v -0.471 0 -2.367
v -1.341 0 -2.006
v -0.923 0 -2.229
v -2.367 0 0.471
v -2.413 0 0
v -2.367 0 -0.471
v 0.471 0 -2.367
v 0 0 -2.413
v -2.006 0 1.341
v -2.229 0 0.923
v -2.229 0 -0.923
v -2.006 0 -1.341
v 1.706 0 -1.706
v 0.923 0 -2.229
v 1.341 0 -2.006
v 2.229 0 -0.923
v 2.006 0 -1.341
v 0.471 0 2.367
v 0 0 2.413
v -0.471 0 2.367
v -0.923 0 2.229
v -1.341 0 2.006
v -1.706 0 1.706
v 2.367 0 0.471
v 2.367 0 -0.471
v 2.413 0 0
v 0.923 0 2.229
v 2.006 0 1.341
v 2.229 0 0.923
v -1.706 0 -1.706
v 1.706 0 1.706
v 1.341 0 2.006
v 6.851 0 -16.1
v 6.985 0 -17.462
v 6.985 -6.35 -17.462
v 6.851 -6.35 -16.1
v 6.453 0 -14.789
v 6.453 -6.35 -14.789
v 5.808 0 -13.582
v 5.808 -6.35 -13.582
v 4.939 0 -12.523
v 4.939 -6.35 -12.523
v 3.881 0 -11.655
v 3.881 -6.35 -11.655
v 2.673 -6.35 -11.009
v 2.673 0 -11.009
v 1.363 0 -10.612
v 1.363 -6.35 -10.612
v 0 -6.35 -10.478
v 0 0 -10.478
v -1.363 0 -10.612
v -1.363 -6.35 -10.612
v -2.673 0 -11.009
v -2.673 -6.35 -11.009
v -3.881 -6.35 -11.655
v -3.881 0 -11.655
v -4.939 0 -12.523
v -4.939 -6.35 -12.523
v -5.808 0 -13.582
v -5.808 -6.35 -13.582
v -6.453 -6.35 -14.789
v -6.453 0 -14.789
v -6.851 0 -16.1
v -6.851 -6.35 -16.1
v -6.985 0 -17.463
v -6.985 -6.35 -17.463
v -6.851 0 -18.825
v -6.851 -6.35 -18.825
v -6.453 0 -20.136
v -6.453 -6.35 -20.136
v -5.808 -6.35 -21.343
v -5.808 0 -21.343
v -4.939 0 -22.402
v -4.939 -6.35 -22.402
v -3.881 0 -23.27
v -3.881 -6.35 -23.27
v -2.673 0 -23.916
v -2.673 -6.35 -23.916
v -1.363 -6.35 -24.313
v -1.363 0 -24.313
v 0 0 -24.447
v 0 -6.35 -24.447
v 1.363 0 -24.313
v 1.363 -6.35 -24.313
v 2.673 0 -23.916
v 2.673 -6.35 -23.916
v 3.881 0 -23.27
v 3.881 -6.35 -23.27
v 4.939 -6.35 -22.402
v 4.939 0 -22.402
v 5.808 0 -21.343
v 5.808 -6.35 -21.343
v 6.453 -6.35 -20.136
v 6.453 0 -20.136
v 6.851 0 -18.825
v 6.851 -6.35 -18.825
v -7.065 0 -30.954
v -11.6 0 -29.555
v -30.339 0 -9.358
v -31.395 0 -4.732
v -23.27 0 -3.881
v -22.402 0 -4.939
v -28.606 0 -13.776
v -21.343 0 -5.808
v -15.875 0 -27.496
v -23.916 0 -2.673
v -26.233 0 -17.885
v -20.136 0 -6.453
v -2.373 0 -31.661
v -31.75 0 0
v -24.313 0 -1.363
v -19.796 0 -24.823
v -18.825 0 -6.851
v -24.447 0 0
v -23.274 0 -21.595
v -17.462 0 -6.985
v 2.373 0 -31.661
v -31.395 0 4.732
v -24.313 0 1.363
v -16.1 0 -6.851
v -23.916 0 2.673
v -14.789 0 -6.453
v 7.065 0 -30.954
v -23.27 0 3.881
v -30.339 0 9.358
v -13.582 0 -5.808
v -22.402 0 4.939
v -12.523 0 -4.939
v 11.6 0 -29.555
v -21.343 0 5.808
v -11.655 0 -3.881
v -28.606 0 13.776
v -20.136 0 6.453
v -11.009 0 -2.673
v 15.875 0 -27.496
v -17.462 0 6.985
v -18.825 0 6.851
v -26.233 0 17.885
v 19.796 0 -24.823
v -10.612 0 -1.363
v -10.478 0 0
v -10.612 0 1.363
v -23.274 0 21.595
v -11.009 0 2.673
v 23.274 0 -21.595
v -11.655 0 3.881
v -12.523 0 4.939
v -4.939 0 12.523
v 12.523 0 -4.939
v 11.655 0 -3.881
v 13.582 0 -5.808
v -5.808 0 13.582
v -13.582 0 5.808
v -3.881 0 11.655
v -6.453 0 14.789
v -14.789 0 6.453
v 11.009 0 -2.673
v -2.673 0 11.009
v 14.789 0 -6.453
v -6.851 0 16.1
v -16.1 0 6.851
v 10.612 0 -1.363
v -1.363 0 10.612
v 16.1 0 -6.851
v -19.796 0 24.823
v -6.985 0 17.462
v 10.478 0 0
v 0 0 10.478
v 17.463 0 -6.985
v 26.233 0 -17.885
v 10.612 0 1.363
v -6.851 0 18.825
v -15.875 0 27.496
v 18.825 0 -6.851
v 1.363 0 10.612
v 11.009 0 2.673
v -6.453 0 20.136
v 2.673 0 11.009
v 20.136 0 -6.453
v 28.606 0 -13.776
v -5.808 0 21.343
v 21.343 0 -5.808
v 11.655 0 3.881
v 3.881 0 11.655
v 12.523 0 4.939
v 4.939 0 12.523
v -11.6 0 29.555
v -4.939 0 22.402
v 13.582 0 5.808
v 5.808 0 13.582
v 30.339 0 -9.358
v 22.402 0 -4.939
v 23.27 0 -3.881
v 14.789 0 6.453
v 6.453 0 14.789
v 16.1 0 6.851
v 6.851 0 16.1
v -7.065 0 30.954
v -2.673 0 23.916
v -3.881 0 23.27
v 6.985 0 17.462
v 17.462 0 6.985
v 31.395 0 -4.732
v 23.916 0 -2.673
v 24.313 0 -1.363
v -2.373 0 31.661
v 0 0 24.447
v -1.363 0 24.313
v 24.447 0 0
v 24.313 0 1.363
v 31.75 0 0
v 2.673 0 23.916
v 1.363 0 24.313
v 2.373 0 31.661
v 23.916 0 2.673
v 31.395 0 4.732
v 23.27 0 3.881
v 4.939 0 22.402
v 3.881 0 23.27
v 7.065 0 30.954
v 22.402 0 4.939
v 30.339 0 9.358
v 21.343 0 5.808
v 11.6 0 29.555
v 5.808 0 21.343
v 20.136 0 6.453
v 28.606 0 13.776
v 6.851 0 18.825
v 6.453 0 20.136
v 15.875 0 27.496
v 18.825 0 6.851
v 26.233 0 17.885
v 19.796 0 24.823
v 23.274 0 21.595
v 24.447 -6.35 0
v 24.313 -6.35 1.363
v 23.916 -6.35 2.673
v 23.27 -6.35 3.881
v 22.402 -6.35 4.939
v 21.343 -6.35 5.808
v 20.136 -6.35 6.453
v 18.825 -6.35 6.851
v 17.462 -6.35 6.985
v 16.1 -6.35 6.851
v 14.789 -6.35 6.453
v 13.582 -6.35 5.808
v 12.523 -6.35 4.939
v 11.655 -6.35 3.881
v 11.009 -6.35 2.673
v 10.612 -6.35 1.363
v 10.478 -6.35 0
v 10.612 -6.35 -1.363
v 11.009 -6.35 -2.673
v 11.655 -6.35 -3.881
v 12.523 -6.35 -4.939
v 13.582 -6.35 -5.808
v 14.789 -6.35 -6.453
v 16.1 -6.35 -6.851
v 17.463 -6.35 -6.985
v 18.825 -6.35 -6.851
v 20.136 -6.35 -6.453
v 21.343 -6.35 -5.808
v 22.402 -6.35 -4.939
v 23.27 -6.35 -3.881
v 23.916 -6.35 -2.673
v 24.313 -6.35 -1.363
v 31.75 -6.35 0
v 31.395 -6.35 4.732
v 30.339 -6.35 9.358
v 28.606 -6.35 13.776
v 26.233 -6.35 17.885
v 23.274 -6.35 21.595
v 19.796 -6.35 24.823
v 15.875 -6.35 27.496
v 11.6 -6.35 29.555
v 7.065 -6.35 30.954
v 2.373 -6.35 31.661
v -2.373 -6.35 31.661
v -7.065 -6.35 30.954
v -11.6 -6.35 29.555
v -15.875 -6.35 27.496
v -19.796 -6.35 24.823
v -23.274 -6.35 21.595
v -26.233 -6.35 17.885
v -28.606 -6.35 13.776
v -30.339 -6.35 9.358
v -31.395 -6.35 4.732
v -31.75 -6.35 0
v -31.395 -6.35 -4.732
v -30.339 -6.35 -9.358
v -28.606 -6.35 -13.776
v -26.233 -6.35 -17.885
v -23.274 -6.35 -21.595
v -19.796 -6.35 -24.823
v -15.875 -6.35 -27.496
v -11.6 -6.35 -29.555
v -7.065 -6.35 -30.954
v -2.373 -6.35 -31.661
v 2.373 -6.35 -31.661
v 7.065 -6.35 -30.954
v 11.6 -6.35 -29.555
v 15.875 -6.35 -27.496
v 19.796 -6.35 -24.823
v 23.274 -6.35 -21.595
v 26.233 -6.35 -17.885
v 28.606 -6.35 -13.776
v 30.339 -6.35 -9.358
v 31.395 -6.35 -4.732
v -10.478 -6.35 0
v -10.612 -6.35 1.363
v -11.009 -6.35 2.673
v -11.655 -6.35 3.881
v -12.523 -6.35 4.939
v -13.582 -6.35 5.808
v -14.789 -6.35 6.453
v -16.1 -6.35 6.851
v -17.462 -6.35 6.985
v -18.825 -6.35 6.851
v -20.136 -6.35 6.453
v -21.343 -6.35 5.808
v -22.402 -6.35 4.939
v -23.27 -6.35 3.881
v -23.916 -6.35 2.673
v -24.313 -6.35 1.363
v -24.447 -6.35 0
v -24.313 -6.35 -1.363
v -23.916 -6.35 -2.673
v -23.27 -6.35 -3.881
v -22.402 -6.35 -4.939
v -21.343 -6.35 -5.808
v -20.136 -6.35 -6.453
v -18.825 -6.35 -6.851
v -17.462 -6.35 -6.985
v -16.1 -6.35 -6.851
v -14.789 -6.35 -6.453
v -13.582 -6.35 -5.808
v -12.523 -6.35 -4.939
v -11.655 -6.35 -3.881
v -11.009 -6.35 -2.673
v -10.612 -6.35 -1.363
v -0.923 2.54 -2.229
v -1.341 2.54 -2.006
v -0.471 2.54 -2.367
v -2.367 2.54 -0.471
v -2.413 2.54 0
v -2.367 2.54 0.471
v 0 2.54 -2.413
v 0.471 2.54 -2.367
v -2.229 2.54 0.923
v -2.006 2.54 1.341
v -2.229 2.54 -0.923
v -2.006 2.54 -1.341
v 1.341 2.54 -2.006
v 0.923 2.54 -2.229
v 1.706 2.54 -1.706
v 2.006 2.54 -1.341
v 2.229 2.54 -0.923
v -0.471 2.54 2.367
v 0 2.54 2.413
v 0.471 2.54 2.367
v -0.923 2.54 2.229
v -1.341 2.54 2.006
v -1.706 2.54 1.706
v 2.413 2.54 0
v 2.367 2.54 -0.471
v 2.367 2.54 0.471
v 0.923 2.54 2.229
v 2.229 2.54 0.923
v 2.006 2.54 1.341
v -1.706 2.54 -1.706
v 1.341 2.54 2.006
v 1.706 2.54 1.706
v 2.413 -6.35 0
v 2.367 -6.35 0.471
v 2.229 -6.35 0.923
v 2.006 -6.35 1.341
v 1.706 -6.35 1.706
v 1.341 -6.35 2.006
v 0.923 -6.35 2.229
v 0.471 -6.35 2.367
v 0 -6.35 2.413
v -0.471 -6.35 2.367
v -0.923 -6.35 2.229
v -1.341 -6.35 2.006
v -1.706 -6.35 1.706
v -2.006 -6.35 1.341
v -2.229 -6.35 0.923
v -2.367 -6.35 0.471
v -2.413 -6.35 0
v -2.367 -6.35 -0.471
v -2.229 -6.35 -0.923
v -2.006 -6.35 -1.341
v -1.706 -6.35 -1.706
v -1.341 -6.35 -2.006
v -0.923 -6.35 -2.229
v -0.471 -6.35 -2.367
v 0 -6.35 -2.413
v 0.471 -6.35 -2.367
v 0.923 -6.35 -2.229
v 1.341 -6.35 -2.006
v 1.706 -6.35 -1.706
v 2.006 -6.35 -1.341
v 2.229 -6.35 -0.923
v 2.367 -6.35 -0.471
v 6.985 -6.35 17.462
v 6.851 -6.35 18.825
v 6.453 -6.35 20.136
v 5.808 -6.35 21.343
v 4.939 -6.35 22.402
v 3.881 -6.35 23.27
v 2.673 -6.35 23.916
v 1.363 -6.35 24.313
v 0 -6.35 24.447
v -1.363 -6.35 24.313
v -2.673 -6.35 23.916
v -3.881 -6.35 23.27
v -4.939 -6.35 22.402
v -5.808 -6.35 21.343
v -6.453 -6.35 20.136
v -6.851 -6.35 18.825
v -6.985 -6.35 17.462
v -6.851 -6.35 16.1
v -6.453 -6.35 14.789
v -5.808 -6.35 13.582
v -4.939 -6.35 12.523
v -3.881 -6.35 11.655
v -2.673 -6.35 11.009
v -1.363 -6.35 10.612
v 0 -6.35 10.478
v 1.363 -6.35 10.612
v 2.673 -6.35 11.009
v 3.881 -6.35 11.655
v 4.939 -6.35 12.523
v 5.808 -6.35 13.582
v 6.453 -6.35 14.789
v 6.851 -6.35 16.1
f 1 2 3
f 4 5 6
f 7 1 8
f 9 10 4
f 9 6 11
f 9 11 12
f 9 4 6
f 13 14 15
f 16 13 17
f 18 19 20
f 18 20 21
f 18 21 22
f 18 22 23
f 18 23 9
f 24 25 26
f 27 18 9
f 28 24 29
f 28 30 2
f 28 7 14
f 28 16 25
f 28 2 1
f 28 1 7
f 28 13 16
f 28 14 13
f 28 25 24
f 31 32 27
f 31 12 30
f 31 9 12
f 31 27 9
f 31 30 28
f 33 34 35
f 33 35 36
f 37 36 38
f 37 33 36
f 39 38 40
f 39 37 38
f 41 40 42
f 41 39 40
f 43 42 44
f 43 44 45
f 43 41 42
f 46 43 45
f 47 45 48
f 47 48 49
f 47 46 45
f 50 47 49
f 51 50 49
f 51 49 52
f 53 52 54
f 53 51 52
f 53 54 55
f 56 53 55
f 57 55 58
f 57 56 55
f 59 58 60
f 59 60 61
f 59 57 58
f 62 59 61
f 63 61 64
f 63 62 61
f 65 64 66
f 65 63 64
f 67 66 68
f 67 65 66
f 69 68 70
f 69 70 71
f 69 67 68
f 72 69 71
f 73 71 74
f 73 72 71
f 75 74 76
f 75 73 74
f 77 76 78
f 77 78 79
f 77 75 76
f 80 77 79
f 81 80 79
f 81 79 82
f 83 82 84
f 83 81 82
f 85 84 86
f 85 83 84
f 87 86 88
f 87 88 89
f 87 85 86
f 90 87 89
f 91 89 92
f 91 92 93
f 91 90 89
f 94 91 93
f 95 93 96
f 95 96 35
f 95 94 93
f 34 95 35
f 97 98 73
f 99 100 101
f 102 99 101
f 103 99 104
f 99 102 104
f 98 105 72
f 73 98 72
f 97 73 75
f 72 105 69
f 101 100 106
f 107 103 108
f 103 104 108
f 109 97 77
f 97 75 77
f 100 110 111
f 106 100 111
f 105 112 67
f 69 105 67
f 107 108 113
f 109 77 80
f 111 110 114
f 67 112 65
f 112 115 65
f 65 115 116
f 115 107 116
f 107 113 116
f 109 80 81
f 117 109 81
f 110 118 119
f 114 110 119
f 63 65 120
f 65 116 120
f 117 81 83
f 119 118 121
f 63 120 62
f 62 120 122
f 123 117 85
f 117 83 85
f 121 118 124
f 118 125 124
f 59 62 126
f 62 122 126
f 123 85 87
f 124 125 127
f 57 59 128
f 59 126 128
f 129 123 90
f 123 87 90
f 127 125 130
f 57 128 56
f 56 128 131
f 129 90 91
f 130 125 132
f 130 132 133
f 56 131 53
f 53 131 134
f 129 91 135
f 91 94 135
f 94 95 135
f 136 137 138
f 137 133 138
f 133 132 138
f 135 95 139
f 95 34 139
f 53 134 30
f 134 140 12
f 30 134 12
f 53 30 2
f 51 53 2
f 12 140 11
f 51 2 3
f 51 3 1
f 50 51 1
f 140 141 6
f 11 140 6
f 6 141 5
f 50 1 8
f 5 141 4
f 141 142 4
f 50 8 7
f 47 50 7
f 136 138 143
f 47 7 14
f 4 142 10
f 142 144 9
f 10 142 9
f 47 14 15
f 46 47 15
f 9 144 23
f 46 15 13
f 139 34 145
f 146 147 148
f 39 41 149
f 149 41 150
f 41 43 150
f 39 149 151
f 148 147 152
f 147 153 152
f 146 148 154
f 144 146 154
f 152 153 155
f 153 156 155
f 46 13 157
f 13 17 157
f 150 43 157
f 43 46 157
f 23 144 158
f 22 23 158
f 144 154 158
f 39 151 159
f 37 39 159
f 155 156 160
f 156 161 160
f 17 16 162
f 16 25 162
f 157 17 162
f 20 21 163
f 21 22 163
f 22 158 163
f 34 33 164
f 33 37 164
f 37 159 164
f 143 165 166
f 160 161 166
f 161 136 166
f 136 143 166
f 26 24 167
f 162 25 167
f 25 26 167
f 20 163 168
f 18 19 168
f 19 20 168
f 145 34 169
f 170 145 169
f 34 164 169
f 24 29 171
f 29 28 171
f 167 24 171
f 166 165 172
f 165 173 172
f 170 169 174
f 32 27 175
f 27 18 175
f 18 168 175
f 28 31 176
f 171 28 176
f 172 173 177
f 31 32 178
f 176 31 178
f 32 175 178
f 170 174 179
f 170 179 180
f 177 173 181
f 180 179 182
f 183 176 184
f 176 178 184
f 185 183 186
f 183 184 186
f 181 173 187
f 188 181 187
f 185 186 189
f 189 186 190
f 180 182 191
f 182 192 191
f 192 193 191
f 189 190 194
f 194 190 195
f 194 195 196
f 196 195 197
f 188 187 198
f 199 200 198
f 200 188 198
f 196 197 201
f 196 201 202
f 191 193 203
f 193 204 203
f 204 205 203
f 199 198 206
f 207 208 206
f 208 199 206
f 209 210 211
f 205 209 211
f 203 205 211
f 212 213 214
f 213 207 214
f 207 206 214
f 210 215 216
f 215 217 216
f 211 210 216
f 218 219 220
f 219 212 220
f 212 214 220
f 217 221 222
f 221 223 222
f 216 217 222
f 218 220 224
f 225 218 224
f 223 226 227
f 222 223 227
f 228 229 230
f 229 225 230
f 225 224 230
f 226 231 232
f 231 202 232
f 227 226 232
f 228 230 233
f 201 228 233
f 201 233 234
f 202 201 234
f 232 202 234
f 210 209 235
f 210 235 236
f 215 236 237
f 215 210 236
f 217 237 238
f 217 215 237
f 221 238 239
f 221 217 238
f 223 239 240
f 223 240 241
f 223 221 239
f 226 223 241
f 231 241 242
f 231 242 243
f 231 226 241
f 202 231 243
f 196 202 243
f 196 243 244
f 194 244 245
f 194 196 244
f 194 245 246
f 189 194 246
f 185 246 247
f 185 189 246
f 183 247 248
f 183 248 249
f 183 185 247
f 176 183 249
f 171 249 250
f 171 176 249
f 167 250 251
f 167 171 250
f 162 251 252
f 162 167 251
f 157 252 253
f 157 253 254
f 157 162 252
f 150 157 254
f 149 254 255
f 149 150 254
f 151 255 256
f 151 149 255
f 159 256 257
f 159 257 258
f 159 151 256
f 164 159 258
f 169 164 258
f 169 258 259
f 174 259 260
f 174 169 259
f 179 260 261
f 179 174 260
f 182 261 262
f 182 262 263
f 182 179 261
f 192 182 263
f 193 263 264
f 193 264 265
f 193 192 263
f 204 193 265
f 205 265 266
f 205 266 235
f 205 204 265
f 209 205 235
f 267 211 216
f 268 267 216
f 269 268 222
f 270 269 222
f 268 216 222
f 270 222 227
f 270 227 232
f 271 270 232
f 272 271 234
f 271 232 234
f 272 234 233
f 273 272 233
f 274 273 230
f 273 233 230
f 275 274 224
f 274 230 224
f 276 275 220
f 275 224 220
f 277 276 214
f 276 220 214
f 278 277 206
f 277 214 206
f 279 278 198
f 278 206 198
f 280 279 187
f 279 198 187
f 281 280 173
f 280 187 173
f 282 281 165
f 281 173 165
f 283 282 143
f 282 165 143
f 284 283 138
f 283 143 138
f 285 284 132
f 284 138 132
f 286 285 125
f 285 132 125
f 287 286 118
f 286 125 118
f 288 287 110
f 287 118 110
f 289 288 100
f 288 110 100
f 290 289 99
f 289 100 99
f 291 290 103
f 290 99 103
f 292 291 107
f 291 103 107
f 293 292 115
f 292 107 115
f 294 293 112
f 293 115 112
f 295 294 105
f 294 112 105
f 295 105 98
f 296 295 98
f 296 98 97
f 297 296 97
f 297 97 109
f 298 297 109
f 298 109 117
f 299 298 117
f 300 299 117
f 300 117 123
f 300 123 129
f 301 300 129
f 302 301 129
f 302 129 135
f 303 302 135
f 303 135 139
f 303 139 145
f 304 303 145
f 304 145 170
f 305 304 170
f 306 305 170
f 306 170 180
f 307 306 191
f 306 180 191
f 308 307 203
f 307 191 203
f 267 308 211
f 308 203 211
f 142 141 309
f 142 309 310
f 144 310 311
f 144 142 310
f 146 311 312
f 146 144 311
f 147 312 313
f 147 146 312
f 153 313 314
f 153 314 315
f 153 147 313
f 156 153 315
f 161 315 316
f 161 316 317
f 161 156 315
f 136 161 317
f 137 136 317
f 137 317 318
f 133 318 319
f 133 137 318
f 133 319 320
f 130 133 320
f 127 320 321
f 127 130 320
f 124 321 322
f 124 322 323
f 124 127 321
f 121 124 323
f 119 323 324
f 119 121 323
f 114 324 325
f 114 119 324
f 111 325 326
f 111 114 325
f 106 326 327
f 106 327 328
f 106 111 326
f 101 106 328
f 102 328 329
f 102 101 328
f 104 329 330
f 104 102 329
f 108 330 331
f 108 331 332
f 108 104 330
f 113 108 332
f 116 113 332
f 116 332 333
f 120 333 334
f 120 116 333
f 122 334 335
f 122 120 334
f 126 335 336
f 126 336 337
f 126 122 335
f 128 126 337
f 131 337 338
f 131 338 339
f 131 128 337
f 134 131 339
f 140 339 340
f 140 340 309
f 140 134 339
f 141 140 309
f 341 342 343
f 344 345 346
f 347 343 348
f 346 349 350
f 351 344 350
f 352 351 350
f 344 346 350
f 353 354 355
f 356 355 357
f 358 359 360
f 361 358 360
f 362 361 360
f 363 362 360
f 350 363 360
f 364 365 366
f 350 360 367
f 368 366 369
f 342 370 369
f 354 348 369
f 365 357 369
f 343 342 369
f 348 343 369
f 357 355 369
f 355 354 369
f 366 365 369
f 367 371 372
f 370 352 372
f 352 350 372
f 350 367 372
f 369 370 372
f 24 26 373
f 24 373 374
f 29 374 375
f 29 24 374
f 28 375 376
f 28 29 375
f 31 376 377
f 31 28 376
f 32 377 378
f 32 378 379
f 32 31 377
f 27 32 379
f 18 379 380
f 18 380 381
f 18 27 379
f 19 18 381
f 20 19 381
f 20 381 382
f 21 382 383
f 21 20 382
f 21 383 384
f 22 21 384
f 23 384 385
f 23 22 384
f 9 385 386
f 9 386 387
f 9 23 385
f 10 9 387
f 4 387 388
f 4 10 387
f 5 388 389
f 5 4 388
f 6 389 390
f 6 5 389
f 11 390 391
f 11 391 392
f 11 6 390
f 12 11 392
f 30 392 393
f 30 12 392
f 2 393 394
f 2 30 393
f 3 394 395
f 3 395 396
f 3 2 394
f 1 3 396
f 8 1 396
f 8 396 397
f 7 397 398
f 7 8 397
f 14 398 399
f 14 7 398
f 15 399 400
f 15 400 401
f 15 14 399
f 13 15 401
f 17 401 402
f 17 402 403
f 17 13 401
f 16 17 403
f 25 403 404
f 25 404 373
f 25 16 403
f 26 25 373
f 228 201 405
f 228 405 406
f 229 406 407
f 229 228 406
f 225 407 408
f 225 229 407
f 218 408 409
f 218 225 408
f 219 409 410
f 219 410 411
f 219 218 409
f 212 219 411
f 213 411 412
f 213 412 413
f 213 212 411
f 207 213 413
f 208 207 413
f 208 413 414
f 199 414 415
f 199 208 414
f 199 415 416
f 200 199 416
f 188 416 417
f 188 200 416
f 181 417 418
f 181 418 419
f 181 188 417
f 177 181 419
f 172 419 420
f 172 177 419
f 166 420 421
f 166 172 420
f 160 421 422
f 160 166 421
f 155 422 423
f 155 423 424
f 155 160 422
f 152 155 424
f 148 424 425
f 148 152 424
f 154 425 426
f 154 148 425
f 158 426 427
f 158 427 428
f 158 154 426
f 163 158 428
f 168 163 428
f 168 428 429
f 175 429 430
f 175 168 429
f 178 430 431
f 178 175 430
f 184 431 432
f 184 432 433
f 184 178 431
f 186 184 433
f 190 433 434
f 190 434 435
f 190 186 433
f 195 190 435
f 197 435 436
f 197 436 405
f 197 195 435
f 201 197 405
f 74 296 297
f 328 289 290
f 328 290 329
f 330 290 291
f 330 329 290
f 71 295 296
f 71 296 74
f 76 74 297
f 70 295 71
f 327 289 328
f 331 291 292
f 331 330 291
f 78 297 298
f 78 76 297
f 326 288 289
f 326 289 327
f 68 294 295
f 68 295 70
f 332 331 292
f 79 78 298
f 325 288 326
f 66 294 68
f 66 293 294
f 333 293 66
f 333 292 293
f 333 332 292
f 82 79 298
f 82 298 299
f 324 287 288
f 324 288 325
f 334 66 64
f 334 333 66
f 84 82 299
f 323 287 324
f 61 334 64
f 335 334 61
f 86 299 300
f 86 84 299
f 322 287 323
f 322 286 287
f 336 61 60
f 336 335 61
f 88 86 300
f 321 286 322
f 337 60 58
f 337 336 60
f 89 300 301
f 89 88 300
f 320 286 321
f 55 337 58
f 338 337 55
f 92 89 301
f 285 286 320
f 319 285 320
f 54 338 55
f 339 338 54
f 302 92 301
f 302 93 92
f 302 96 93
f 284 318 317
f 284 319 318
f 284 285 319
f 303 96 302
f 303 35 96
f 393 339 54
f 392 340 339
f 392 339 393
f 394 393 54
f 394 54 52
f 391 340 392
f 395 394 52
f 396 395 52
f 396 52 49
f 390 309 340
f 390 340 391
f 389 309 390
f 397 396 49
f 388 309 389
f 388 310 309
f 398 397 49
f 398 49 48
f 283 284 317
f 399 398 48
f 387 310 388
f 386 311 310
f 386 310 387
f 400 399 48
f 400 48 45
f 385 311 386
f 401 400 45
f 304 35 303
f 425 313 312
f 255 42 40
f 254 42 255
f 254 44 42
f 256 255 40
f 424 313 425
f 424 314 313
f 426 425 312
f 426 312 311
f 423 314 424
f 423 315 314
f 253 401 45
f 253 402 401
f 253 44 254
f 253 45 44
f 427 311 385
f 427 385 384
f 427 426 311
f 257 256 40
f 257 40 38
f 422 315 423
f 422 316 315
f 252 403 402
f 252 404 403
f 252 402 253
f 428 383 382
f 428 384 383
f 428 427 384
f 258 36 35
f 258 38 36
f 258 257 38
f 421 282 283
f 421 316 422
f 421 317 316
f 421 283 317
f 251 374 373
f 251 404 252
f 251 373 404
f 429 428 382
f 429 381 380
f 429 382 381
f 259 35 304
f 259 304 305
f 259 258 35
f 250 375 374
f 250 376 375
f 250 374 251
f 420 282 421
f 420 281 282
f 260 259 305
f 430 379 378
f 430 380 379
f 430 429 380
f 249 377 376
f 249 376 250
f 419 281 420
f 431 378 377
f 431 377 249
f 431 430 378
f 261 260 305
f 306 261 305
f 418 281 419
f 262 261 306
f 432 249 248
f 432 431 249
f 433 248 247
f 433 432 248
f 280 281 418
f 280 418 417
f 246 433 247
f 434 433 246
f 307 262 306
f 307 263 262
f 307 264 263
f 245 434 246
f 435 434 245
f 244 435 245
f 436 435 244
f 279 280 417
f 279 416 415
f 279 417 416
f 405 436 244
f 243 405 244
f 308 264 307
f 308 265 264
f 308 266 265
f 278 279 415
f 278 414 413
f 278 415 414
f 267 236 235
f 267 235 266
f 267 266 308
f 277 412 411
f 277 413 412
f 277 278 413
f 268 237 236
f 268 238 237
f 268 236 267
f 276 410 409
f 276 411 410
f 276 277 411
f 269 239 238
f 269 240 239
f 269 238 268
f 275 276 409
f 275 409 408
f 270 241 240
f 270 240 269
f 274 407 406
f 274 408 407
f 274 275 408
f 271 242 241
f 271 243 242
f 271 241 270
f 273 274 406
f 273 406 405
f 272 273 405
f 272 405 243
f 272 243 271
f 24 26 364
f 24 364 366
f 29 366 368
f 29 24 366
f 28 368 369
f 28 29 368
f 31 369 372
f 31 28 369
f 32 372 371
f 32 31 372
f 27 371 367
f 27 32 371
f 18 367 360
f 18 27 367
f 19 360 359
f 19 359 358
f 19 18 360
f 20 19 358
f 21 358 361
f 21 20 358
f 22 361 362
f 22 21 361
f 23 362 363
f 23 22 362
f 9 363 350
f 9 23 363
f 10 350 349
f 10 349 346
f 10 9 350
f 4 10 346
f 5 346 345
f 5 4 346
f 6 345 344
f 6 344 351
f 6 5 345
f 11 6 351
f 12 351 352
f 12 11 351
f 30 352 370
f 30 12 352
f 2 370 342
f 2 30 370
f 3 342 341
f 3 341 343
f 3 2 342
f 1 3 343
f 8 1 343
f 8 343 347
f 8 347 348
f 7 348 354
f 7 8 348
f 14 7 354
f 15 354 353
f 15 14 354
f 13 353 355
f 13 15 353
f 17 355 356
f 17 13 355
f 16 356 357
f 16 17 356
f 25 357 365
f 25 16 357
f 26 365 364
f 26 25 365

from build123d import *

# Parameters (mm, degrees)
F0_R     = 31.75
F0_R_2   = 6.985
F0_R_3   = 2.413
F1_DEPTH = 6.35
F2_DEPTH = 2.54


with BuildPart() as f1:
    # F0 (on Front) → F1 (new body)
    with BuildSketch(Plane.XZ):
        Circle(F0_R)
        with Locations((0, -17.4625)):
            Circle(F0_R_2, mode=Mode.SUBTRACT)
        with Locations((-17.4625, 0)):
            Circle(F0_R_2, mode=Mode.SUBTRACT)
        Circle(F0_R_3, mode=Mode.SUBTRACT)
        with Locations((17.4625, 0)):
            Circle(F0_R_2, mode=Mode.SUBTRACT)
        with Locations((0, 17.4625)):
            Circle(F0_R_2, mode=Mode.SUBTRACT)
    extrude(amount=F1_DEPTH)


with BuildPart() as f2:
    # F0 (on Front) → F2 (new body)
    with BuildSketch(Plane.XZ):
        Circle(F0_R_3)
    extrude(amount=-F2_DEPTH)


solid = Compound([f1.part, f2.part])
